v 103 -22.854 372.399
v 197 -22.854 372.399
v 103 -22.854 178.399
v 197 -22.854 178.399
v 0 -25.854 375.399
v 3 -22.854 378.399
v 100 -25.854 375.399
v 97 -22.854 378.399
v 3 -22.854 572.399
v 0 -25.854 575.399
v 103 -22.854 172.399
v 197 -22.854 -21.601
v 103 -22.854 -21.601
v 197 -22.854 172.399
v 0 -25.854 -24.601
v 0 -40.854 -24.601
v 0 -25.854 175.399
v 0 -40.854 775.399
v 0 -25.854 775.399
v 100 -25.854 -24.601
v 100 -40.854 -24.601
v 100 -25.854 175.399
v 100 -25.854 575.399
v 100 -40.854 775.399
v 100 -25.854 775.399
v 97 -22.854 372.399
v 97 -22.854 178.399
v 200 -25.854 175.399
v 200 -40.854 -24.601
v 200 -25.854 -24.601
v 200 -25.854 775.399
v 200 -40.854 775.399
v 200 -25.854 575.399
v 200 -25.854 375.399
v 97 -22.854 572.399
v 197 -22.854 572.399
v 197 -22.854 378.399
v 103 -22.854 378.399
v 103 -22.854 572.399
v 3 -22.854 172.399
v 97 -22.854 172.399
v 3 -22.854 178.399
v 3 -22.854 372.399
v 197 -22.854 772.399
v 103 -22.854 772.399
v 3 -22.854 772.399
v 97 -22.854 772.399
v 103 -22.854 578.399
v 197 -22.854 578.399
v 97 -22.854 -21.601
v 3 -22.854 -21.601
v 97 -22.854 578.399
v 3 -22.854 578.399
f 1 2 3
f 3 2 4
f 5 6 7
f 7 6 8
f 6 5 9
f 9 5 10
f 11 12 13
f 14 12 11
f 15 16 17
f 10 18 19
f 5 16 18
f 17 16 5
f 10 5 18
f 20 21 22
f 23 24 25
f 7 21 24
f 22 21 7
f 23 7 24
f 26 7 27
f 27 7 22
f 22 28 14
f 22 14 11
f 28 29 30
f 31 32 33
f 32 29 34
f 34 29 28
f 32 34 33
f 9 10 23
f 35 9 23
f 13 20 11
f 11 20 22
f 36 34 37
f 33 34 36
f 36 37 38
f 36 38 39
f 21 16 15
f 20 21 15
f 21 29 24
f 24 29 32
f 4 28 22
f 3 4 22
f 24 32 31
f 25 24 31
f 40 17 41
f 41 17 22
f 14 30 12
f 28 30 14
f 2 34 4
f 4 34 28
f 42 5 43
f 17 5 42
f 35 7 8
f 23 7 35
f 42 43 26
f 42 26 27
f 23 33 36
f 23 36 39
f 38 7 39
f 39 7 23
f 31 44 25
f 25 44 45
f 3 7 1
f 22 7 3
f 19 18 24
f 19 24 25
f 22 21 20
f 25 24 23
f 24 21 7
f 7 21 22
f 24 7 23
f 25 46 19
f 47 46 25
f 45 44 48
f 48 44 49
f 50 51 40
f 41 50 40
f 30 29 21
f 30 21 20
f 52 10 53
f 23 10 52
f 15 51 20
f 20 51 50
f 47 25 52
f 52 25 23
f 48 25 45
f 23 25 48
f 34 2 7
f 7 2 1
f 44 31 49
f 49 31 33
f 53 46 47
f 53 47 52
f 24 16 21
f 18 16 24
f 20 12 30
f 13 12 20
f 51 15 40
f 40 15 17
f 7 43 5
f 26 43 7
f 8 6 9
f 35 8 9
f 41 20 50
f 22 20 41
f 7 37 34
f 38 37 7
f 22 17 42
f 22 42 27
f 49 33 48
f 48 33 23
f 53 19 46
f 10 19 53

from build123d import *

# Parameters (mm, degrees)
F0_W     = 18
F0_H     = 200
F1_DEPTH = 100
F2_SIZE  = 3


with BuildPart() as f1:
    # F0 (on Right) → F1 (new body)
    with BuildSketch(Plane.YZ):
        with Locations((-31.8543244302, 75.3988552839)):
            Rectangle(F0_W, F0_H)
    extrude(amount=F1_DEPTH)

    # F2
    f2_edges = [f1.edges().sort_by_distance(p)[0] for p in [
        (50, -22.854324, 175.398855),
        (100, -22.854324, 75.398855),
        (0, -22.854324, 75.398855),
        (50, -22.854324, -24.601145),
    ]]
    chamfer(f2_edges, length=F2_SIZE)

    # F3: F1 across face


with BuildPart() as f1_1:
    add(f1.part)
    add(f1.part.mirror(Plane(origin=(50, -33.3543244302, 175.3988552839), x_dir=(1, 0, 0), z_dir=(0, 0, 1))))

    # F4: F1 across face


with BuildPart() as f1_2:
    add(f1_1.part)
    add(f1_1.part.mirror(Plane(origin=(50, -33.3543244302, 375.3988552839), x_dir=(1, 0, 0), z_dir=(0, 0, 1))))


with BuildPart() as f5_1:
    # F5: instance of F1
    add(f1_2.part.mirror(Plane(origin=(100, -33.3543244302, 375.3988552839), x_dir=(0, 1, 0), z_dir=(1, 0, 0))))


solid = Compound([f1_2.part, f5_1.part])
